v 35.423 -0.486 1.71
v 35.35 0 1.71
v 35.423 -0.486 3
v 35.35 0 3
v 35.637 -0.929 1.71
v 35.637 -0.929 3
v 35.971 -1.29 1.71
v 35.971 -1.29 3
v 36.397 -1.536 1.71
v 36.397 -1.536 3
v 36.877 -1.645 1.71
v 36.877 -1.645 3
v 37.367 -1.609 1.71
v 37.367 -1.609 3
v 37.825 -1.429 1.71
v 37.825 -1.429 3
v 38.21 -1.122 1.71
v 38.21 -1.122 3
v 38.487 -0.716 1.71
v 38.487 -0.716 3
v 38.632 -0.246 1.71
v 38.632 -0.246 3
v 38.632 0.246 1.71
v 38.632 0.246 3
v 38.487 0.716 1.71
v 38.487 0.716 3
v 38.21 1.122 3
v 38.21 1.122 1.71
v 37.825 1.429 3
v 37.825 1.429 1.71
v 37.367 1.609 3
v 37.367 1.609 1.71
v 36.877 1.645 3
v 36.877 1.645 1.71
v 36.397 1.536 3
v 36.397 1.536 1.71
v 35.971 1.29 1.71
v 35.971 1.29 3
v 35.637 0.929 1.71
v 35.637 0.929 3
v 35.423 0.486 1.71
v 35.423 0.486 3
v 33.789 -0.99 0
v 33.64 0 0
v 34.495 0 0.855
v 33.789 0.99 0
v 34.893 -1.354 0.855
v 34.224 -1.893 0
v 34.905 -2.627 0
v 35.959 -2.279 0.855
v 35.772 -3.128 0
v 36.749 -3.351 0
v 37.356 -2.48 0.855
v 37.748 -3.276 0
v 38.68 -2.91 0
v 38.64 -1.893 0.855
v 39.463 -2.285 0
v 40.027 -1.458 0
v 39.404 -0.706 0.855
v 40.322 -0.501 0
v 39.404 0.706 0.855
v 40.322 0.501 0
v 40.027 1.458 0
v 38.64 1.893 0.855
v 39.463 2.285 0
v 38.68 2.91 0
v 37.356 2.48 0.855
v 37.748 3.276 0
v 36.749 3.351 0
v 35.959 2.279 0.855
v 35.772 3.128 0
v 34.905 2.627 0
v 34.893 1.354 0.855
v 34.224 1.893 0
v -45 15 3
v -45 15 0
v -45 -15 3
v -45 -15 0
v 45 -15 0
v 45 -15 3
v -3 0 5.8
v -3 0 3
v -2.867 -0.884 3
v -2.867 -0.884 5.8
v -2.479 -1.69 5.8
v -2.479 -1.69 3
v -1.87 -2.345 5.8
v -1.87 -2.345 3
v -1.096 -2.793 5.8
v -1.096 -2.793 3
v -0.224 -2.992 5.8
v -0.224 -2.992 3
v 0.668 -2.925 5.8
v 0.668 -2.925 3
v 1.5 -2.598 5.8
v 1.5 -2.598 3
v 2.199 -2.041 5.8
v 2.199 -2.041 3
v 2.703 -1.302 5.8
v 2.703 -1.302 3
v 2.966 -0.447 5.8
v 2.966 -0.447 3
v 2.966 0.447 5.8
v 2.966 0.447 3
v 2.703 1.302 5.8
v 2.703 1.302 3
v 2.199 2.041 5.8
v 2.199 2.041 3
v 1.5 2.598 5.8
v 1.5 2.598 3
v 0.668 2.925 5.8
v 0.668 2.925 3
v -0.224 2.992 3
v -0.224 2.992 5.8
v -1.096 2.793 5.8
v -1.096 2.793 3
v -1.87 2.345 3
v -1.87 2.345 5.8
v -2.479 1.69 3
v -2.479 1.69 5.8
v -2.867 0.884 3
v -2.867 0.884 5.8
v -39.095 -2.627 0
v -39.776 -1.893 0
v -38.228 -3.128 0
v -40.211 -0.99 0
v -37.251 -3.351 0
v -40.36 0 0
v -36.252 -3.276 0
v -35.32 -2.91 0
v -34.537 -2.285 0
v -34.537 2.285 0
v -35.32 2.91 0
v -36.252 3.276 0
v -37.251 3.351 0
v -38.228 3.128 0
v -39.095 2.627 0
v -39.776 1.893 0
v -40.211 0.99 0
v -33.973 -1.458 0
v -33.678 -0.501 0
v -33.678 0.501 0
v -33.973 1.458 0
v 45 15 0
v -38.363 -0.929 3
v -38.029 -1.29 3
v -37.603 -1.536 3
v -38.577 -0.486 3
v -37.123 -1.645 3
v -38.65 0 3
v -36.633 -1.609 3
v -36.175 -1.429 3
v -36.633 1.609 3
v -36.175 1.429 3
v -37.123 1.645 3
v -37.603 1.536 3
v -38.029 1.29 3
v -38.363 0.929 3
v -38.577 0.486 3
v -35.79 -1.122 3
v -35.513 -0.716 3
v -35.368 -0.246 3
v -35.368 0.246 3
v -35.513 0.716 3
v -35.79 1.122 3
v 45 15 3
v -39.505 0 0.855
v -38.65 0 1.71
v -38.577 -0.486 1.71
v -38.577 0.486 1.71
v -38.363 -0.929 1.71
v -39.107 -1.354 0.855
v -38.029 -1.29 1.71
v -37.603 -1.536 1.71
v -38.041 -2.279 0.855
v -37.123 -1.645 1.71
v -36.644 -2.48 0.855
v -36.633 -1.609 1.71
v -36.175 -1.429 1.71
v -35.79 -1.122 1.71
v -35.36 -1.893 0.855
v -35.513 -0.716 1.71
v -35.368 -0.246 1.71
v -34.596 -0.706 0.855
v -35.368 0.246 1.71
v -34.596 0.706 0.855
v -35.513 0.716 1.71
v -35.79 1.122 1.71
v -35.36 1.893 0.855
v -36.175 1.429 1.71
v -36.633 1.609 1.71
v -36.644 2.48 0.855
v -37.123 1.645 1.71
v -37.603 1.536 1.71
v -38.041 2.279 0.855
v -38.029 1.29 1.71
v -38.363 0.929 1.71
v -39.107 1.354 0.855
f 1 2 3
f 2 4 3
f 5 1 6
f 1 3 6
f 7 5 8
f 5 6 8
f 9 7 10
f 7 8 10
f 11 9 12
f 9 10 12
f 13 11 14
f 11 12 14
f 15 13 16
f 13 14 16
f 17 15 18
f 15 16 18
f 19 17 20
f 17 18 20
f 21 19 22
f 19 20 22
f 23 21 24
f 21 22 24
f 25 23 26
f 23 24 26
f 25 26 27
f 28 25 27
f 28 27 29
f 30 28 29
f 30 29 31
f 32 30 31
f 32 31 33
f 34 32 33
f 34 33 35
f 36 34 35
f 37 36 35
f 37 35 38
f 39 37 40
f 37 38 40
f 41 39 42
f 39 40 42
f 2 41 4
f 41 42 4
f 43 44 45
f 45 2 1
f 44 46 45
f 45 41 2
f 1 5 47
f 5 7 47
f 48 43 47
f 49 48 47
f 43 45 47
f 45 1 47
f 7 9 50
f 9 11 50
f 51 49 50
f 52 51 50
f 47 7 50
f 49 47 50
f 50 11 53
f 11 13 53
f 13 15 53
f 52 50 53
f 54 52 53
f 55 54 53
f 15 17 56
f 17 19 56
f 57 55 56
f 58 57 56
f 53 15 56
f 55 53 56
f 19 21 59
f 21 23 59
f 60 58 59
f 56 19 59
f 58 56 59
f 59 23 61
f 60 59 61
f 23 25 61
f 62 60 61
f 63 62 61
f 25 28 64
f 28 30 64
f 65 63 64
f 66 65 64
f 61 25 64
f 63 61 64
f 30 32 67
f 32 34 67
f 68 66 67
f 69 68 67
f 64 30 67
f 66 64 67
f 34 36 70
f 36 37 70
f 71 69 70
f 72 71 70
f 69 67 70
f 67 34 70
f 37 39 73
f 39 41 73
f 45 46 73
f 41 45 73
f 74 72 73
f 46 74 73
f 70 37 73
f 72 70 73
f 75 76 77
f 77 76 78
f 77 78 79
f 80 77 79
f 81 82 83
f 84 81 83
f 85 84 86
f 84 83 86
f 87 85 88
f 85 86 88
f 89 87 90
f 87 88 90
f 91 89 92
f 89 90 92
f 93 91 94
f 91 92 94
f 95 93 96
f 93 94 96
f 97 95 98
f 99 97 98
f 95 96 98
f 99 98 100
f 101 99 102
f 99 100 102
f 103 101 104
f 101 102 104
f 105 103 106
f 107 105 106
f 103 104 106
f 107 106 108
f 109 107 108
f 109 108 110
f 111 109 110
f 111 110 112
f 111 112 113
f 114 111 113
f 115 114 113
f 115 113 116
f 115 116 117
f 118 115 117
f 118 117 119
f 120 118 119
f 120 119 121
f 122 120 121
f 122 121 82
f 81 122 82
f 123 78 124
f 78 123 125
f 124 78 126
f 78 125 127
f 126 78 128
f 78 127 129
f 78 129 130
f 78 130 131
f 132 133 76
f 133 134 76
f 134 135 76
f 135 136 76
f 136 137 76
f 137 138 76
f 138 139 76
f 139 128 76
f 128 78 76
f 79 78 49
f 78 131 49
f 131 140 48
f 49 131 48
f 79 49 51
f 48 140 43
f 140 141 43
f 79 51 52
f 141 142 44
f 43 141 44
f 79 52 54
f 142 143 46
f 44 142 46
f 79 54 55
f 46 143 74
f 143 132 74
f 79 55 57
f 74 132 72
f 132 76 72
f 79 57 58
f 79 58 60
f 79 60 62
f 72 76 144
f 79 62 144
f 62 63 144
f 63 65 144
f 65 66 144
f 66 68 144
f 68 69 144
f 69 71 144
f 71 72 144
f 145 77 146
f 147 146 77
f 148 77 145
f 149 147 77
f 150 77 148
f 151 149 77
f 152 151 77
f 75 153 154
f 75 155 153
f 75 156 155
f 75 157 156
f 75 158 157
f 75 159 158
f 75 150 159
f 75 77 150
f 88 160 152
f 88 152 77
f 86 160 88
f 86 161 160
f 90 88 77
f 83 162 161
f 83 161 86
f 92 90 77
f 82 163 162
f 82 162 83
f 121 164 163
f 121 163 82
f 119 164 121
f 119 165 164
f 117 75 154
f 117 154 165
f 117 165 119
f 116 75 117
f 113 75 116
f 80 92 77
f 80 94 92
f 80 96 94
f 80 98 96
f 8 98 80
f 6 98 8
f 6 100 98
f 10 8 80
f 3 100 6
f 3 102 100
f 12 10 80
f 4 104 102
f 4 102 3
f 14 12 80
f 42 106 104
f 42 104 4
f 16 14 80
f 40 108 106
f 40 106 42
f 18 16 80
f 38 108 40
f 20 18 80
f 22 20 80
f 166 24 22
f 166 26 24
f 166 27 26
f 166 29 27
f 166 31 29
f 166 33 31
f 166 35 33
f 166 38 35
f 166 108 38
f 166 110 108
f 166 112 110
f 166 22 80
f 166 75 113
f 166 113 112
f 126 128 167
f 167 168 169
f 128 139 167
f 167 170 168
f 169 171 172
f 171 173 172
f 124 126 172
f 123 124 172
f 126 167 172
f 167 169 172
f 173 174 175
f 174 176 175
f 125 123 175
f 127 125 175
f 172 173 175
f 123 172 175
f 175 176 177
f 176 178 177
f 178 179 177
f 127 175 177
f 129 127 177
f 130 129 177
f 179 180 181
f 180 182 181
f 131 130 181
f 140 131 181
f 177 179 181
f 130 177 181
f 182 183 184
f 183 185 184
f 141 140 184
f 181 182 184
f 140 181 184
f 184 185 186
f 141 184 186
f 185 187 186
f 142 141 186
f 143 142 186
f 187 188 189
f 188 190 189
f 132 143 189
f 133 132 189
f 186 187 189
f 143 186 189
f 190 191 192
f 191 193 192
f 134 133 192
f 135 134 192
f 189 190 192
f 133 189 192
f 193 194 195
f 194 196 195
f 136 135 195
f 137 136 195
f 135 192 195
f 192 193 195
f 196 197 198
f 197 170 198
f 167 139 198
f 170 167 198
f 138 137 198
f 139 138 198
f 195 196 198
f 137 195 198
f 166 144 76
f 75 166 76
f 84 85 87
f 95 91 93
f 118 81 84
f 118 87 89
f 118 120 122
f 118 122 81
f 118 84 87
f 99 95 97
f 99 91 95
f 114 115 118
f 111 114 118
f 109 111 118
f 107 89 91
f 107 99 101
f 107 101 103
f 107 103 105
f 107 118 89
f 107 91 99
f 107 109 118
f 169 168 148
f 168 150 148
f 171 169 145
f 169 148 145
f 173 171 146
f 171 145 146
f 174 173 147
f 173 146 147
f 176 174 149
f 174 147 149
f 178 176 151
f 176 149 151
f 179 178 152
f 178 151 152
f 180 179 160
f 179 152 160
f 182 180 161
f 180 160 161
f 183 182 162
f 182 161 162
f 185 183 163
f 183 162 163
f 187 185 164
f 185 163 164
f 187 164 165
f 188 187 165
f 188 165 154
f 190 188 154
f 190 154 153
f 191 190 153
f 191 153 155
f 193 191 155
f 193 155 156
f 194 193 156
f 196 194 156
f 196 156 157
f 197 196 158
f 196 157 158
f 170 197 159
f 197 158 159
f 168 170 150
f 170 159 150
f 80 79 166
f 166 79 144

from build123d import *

# Parameters (mm, degrees)
F1_DEPTH       = 3
F2_DEPTH       = 5.8
F3_D           = 3.3
F3_CSINK_D     = 6.72
F3_CSINK_ANGLE = 90


with BuildPart() as f1:
    # F0 (on Top) → F1 (new body)
    with BuildSketch(Plane.XY):
        with BuildLine():
            ThreePointArc((-3, 0), (0, 3), (3, 0))
            Line((3, 0), (45, 0))
            Line((45, 0), (45, 15))
            Line((45, 15), (-45, 15))
            Line((-45, 15), (-45, 0))
            Line((-45, 0), (-3, 0))
        make_face()
        with BuildLine():
            Line((45, 0), (3, 0))
            ThreePointArc((3, 0), (0, -3), (-3, 0))
            Line((-3, 0), (-45, 0))
            Line((-45, 0), (-45, -15))
            Line((-45, -15), (45, -15))
            Line((45, -15), (45, 0))
        make_face()
    extrude(amount=F1_DEPTH)

    # F0 (on Top) → F2 (join)
    with BuildSketch(Plane.XY):
        with BuildLine():
            Line((-3, 0), (3, 0))
            ThreePointArc((3, 0), (0, 3), (-3, 0))
        make_face()
        with BuildLine():
            ThreePointArc((-3, 0), (0, -3), (3, 0))
            Line((3, 0), (-3, 0))
        make_face()
    extrude(amount=F2_DEPTH)

    # F3 (through all)
    with Locations(Plane(origin=(0, 0, 0), x_dir=(1, 0, 0), z_dir=(0, 0, -1))):
        with Locations((-37, 0), (37, 0)):
            CounterSinkHole(F3_D / 2, F3_CSINK_D / 2, counter_sink_angle=F3_CSINK_ANGLE)


solid = f1.part
